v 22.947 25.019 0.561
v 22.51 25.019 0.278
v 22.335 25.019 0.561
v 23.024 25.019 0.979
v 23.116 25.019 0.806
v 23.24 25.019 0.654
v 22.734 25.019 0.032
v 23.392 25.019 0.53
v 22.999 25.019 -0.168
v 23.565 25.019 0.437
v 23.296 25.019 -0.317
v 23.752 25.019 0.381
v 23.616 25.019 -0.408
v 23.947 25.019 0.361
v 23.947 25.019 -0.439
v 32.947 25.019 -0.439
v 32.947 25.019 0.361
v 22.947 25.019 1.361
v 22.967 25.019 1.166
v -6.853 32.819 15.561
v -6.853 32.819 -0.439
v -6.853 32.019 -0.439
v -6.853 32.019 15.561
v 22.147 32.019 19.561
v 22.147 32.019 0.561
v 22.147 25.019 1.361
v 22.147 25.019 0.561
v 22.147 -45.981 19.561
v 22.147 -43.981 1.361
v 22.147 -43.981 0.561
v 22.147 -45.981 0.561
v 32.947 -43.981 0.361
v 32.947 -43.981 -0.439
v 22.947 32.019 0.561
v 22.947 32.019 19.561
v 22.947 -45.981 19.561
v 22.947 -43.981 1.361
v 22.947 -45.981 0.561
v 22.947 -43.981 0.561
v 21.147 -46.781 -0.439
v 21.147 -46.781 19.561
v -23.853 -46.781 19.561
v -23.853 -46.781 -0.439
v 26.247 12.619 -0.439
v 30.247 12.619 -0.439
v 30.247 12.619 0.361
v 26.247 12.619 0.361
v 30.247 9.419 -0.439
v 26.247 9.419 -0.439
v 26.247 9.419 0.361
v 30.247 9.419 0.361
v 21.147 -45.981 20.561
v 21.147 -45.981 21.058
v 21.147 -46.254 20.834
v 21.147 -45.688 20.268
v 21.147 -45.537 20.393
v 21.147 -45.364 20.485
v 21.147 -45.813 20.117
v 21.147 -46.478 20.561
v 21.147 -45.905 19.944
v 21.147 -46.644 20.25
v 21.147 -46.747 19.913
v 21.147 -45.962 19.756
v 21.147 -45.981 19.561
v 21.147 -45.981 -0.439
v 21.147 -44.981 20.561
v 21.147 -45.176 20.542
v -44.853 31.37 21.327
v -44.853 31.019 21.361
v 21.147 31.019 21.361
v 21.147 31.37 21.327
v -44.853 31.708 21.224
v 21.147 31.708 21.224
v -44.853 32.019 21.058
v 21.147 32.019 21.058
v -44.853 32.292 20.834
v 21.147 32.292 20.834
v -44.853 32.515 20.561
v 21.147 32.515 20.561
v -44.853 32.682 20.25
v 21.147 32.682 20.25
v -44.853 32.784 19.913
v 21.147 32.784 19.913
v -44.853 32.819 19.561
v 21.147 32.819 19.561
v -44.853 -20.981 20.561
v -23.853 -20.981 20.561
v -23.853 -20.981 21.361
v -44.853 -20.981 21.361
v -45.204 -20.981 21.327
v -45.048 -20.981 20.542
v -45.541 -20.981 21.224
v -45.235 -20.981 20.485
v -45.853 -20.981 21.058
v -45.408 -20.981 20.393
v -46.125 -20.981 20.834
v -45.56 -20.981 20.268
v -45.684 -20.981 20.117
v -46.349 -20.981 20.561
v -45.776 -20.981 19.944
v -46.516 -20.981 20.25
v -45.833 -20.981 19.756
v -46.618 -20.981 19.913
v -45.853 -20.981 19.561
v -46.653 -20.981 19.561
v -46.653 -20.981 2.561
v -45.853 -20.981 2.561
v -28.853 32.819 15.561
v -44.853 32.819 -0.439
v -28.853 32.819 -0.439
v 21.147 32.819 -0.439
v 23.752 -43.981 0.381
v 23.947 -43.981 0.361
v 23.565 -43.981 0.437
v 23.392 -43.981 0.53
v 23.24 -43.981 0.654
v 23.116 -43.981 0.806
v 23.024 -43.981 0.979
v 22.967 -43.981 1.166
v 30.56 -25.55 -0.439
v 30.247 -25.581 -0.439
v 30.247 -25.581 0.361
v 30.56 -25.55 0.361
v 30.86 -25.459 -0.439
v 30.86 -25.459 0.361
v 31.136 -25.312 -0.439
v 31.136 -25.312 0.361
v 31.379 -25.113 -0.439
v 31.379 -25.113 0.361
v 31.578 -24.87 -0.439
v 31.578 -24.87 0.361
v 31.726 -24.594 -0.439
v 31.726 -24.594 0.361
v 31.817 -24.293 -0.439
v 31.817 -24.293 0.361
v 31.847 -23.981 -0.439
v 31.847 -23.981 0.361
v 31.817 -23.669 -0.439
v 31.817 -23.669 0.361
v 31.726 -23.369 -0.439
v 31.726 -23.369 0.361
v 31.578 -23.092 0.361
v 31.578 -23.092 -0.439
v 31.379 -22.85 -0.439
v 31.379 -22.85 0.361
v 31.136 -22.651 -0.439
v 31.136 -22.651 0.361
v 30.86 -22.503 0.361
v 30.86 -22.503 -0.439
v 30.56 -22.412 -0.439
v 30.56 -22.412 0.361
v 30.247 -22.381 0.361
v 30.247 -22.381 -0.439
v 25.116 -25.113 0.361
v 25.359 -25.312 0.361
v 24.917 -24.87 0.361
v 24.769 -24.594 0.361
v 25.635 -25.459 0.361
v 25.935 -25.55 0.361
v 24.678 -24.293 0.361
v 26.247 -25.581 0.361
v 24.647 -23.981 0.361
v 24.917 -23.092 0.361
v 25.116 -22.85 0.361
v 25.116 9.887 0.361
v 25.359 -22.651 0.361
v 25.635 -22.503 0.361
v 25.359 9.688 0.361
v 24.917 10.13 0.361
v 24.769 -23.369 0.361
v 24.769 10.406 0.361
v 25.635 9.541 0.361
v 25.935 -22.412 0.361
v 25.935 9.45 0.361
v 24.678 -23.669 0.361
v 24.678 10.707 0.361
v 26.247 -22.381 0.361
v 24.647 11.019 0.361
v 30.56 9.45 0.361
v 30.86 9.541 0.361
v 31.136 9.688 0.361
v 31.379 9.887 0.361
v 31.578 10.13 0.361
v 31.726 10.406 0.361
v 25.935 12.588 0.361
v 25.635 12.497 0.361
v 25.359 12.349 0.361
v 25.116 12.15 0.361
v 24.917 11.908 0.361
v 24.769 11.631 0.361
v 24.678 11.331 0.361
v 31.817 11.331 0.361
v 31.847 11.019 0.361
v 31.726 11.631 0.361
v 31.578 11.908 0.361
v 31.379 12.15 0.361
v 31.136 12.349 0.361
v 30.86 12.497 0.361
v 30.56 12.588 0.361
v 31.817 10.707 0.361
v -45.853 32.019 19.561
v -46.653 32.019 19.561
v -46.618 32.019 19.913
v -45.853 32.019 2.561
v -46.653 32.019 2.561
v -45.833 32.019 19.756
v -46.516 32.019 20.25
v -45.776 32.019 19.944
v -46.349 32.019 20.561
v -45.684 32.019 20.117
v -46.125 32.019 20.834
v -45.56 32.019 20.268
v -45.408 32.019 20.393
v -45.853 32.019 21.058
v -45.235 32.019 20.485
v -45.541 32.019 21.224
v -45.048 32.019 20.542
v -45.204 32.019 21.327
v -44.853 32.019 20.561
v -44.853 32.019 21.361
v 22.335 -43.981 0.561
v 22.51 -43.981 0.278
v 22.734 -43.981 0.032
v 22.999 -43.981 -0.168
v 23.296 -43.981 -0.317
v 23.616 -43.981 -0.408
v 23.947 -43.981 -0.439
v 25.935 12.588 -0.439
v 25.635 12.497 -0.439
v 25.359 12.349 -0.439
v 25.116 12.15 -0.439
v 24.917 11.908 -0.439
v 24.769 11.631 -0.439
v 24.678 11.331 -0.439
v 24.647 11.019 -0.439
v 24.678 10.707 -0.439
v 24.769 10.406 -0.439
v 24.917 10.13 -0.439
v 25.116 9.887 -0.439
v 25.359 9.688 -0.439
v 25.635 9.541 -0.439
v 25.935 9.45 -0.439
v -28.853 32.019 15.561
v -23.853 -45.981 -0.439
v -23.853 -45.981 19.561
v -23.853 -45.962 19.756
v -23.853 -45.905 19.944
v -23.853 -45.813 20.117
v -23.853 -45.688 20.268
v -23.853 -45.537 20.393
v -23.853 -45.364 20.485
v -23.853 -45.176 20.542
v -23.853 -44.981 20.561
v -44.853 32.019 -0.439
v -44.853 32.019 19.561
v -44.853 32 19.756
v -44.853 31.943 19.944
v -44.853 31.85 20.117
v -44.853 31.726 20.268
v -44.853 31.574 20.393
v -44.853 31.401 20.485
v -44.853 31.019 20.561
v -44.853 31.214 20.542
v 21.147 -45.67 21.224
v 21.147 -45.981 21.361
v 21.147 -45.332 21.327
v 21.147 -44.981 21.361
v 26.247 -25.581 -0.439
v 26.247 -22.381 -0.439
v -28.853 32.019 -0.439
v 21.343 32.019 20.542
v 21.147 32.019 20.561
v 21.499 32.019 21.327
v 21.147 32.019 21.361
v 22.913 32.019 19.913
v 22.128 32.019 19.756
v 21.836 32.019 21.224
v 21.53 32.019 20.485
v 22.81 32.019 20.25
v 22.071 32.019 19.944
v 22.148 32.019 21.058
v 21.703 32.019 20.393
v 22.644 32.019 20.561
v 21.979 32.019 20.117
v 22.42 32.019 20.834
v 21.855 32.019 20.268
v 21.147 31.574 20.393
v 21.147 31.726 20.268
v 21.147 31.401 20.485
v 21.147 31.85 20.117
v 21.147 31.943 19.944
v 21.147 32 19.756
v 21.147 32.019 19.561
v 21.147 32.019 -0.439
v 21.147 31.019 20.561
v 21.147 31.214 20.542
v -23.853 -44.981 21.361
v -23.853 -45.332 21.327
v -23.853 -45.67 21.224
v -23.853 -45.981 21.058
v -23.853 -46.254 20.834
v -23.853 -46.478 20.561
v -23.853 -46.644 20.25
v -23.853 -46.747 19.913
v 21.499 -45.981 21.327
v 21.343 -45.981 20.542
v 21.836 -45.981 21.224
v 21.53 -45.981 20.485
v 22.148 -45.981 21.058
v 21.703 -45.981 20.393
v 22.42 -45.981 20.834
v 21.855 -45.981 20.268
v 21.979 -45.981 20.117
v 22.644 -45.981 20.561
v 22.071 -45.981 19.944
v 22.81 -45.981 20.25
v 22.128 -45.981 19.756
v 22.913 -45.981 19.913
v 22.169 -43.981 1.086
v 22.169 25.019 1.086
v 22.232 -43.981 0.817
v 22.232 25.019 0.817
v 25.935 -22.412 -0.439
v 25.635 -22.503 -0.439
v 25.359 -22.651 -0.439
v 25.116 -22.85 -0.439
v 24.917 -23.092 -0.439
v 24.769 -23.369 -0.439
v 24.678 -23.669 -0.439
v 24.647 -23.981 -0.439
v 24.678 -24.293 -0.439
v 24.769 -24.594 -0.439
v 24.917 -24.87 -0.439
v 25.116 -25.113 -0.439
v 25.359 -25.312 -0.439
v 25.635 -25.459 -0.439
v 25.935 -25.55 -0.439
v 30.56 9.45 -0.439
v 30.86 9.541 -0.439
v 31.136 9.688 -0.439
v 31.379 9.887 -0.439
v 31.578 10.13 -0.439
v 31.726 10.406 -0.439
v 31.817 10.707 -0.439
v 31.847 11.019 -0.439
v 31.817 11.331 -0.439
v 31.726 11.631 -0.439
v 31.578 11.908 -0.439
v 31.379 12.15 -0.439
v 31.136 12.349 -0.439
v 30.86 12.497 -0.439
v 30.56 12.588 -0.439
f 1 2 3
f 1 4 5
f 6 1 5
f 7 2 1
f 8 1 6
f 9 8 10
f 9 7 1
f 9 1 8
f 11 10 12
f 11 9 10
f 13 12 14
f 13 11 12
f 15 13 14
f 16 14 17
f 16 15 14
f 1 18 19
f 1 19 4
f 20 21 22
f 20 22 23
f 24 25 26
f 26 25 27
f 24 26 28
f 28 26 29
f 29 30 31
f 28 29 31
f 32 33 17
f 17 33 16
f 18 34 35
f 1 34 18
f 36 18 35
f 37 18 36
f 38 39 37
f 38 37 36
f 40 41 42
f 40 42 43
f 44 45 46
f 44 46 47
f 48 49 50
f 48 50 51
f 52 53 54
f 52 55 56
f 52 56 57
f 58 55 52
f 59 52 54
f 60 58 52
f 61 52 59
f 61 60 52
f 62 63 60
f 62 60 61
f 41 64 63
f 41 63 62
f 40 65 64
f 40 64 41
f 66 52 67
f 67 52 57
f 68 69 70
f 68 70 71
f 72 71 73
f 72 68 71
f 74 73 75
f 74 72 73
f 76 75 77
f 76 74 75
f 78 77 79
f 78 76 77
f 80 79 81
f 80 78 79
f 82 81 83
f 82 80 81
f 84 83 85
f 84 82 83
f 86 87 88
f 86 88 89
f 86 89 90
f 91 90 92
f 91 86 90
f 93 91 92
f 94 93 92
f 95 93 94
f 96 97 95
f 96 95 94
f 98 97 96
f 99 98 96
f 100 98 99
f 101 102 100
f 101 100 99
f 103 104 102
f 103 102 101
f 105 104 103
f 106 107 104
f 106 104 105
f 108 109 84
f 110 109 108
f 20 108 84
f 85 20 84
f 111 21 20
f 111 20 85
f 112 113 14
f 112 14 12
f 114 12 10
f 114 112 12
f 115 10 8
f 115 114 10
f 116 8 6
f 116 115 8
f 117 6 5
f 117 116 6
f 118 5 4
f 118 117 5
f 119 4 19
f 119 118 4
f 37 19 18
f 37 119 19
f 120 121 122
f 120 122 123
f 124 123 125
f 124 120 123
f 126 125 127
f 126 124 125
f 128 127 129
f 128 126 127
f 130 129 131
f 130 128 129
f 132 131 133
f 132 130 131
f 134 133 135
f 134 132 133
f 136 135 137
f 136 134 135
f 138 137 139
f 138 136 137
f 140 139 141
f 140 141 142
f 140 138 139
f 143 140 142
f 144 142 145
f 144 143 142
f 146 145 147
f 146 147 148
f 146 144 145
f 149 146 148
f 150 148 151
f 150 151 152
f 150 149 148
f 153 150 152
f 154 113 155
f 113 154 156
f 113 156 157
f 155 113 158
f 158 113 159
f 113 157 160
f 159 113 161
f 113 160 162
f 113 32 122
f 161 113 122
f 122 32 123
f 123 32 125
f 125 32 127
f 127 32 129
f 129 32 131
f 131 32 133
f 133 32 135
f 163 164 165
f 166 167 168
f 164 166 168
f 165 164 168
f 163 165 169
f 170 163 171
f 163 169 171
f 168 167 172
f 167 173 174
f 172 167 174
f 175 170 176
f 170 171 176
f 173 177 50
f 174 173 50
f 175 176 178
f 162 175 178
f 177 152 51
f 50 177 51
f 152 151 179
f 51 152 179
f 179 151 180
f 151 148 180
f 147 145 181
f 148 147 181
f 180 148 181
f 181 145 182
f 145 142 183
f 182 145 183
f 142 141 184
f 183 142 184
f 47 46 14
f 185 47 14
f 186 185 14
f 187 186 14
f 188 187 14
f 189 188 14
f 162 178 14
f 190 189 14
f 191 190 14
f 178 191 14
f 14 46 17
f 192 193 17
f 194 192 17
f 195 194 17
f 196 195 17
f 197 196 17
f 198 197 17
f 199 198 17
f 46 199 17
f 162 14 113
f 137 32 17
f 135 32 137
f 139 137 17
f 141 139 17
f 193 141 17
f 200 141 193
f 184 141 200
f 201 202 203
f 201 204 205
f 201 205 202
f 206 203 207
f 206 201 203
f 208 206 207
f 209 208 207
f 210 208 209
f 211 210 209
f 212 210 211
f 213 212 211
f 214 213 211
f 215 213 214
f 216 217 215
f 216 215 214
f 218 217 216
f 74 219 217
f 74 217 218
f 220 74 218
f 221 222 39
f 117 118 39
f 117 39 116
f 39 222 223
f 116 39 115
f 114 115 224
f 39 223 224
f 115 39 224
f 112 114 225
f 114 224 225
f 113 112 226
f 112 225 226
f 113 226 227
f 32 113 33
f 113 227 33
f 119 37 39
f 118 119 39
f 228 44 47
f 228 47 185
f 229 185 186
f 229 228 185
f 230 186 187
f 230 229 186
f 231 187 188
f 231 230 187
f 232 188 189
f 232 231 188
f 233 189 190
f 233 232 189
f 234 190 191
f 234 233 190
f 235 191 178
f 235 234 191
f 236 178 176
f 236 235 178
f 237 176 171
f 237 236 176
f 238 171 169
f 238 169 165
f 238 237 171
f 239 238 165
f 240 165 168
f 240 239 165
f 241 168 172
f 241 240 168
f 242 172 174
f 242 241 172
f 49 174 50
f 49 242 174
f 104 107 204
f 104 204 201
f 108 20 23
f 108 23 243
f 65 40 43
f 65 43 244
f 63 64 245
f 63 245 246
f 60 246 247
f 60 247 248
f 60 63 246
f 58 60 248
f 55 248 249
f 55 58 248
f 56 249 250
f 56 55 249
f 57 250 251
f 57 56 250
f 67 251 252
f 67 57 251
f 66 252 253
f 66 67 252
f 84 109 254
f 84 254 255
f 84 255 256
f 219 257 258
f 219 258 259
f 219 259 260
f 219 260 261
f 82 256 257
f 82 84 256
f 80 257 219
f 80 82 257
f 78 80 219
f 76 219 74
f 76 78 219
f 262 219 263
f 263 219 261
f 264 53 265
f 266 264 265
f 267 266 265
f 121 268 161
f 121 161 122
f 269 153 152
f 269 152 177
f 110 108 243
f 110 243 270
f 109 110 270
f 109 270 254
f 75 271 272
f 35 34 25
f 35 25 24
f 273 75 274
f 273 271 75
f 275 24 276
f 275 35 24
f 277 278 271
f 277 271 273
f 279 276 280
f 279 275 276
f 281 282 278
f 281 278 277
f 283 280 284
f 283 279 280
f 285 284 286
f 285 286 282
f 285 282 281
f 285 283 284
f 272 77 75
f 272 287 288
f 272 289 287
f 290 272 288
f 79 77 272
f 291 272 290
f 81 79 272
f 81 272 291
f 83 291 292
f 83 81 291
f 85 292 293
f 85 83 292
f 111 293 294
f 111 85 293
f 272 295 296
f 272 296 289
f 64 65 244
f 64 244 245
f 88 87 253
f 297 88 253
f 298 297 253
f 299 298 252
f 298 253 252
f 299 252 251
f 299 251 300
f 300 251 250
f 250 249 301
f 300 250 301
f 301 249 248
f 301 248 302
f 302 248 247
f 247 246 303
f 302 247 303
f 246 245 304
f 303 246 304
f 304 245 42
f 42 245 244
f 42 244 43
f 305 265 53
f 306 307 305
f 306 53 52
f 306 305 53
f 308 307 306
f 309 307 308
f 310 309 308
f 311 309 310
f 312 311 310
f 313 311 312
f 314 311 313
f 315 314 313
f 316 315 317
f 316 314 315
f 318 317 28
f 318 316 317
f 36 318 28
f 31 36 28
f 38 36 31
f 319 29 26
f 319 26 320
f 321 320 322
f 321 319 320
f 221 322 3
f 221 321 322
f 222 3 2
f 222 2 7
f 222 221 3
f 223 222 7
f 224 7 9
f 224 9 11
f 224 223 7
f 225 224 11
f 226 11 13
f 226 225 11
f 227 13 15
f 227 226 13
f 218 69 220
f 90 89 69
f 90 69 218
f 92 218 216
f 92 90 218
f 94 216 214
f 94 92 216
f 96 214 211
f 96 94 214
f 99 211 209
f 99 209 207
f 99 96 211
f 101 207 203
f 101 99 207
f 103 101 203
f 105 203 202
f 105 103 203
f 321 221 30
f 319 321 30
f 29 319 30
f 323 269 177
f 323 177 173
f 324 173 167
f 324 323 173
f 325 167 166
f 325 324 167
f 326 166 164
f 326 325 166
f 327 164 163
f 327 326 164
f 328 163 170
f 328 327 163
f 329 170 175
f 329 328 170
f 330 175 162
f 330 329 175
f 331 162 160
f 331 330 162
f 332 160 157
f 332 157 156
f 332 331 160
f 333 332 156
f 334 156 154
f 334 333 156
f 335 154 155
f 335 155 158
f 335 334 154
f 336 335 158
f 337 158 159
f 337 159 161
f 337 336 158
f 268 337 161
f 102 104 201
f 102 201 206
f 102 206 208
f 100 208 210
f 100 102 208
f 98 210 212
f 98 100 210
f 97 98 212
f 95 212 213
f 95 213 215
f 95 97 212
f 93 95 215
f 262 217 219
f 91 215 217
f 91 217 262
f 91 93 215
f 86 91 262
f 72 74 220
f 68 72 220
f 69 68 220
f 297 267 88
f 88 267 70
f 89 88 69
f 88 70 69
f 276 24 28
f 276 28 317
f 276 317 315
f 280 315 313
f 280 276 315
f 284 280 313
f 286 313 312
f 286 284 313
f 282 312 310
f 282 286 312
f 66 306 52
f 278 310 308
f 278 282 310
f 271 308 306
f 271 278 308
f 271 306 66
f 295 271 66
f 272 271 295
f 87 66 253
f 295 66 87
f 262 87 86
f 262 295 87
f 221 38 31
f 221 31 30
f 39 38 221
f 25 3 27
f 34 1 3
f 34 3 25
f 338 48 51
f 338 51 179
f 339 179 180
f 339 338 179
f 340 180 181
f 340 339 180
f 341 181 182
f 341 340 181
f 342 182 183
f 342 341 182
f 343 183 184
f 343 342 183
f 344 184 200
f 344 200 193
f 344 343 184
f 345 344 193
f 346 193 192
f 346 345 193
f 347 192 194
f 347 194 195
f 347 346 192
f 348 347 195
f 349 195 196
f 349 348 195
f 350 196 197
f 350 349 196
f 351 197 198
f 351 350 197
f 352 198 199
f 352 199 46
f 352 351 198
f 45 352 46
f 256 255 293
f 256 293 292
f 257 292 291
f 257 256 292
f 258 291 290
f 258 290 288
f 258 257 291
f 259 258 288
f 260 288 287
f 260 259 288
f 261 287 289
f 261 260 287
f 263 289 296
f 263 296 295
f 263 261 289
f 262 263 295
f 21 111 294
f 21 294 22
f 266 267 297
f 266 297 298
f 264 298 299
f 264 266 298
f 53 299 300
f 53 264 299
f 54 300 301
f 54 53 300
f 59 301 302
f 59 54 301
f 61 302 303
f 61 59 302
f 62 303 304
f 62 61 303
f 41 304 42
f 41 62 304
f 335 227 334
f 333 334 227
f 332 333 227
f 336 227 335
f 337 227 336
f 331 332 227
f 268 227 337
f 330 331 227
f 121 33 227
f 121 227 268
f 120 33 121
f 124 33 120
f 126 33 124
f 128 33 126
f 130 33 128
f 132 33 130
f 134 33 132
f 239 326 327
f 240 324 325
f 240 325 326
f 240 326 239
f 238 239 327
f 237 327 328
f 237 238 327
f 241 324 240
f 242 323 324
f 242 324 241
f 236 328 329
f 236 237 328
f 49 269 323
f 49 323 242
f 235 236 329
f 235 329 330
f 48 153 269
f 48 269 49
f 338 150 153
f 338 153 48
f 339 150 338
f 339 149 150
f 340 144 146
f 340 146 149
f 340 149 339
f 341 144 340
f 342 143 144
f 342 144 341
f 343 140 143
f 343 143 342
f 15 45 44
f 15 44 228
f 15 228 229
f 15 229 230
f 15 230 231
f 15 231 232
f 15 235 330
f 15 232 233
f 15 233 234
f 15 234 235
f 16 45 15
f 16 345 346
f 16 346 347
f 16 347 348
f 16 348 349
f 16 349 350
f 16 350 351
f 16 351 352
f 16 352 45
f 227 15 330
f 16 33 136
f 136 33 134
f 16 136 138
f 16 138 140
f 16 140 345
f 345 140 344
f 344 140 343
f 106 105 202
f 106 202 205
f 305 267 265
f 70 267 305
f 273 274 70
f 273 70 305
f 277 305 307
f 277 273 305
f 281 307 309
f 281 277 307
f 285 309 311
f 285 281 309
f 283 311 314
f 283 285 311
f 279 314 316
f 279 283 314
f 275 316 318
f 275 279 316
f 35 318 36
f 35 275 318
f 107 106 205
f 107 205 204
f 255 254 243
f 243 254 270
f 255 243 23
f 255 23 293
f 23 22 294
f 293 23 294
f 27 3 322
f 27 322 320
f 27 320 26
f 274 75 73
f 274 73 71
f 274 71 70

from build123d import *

# Parameters (mm, degrees)
BASE_FLANGE1_DEPTH           = 0.8
EDGE_FLANGE1_STRIP_W         = 5.2
EDGE_FLANGE1_STRIP_H         = 0.8
EDGE_FLANGE1_STRIP_CUT_DEPTH = 53
EDGE_FLANGE1_DEPTH           = 53
EDGE_FLANGE4_STRIP_W         = 5.2
EDGE_FLANGE4_STRIP_H         = 0.8
EDGE_FLANGE4_STRIP_CUT_DEPTH = 78
EDGE_FLANGE4_DEPTH           = 78
EDGE_FLANGE4_START           = 0.8
EDGE_FLANGE4_FLAT_DEPTH      = 0.8
EDGE_FLANGE6_STRIP_W         = 5.2
EDGE_FLANGE6_STRIP_H         = 0.8
EDGE_FLANGE6_STRIP_CUT_DEPTH = 69
EDGE_FLANGE6_DEPTH           = 69
EDGE_FLANGE6_PROFILE_W       = 69
EDGE_FLANGE6_PROFILE_H       = 9
EDGE_FLANGE6_FLAT_DEPTH      = 0.8
EDGE_FLANGE7_STRIP_W         = 5.2
EDGE_FLANGE7_STRIP_H         = 0.8
EDGE_FLANGE7_STRIP_CUT_DEPTH = 45
EDGE_FLANGE7_DEPTH           = 45
EDGE_FLANGE8_STRIP_W         = 5.2
EDGE_FLANGE8_STRIP_H         = 0.8
EDGE_FLANGE8_STRIP_CUT_DEPTH = 66
EDGE_FLANGE8_DEPTH           = 66
EDGE_FLANGE8_START           = 0.8
EDGE_FLANGE8_FLAT_DEPTH      = 0.8


# Sheet-metal steps are written as plain solids
with BuildPart() as part:
    # Sketch1 → Base-Flange1 (new body)
    with BuildSketch(Plane.XY.offset(20.561355821)):
        Polygon((22.147479573, -45.981220417), (-23.852520427, -45.981220417), (-23.852520427, -20.981220417), (-45.852520427, -20.981220417), (-45.852520427, 32.018779583), (22.147479573, 32.018779583), align=None)
    extrude(amount=BASE_FLANGE1_DEPTH)

    # Edge-Flange1 strip (across the edge) → Edge-Flange1 strip cut (cut)
    with BuildSketch(Plane(origin=(-45.852520427, -20.981220417, 20.561355821), x_dir=(1, 0, 0), z_dir=(0, 1, 0))):
        with Locations((-1.6, -0.4)):
            Rectangle(EDGE_FLANGE1_STRIP_W, EDGE_FLANGE1_STRIP_H)
    extrude(amount=EDGE_FLANGE1_STRIP_CUT_DEPTH, mode=Mode.SUBTRACT)

    # Edge-Flange1 section (across the edge) → Edge-Flange1 (add)
    with BuildSketch(Plane(origin=(-45.852520427, -20.981220417, 20.561355821), x_dir=(1, 0, 0), z_dir=(0, 1, 0))):
        with BuildLine():
            Line((-0.8, 1), (-0.8, 18))
            Line((-0.8, 18), (0, 18))
            Line((0, 18), (0, 1))
            ThreePointArc((0, 1), (0.292893219, 0.292893219), (1, 0))
            Line((1, 0), (1, -0.8))
            ThreePointArc((1, -0.8), (-0.272792206, -0.272792206), (-0.8, 1))
        make_face()
    extrude(amount=EDGE_FLANGE1_DEPTH)

    # Edge-Flange4 strip (across the edge) → Edge-Flange4 strip cut (cut)
    with BuildSketch(Plane(origin=(22.147479573, 32.018779583, 20.561355821), x_dir=(-1, 0, 0), z_dir=(0, -1, 0))):
        with Locations((-1.6, -0.4)):
            Rectangle(EDGE_FLANGE4_STRIP_W, EDGE_FLANGE4_STRIP_H)
    extrude(amount=EDGE_FLANGE4_STRIP_CUT_DEPTH, mode=Mode.SUBTRACT)

    # Edge-Flange4 bend section (across the edge) → Edge-Flange4 (add)
    with BuildSketch(Plane(origin=(22.147479573, 32.018779583, 20.561355821), x_dir=(-1, 0, 0), z_dir=(0, -1, 0))):
        with BuildLine():
            Line((-0.8, 1), (0, 1))
            ThreePointArc((0, 1), (0.292893219, 0.292893219), (1, 0))
            Line((1, 0), (1, -0.8))
            ThreePointArc((1, -0.8), (-0.272792206, -0.272792206), (-0.8, 1))
        make_face()
    extrude(amount=EDGE_FLANGE4_DEPTH)

    # Edge-Flange4 profile (on flange) → Edge-Flange4 flat (add)
    with BuildSketch(Plane(origin=(22.147479573, 0, 20.561355821), x_dir=(0, -1, 0), z_dir=(1, 0, 0)).offset(EDGE_FLANGE4_START)):
        Polygon((45.981220417, 1), (45.981220417, 20), (43.981220417, 20), (43.981220417, 21), (-25.018779583, 21), (-25.018779583, 20), (-32.018779583, 20), (-32.018779583, 1), align=None)
    extrude(amount=-EDGE_FLANGE4_FLAT_DEPTH)

    # Edge-Flange6 strip (across the edge) → Edge-Flange6 strip cut (cut)
    with BuildSketch(Plane(origin=(22.947479573, -43.981220417, -0.438644179), x_dir=(0, 0, 1), z_dir=(0, 1, 0))):
        with Locations((-0.8, -0.4)):
            Rectangle(EDGE_FLANGE6_STRIP_W, EDGE_FLANGE6_STRIP_H)
    extrude(amount=EDGE_FLANGE6_STRIP_CUT_DEPTH, mode=Mode.SUBTRACT)

    # Edge-Flange6 bend section (across the edge) → Edge-Flange6 (add)
    with BuildSketch(Plane(origin=(22.947479573, -43.981220417, -0.438644179), x_dir=(0, 0, 1), z_dir=(0, 1, 0))):
        with BuildLine():
            Line((0, 1), (0.8, 1))
            ThreePointArc((0.8, 1), (1.092893219, 0.292893219), (1.8, 0))
            Line((1.8, 0), (1.8, -0.8))
            ThreePointArc((1.8, -0.8), (0.527207794, -0.272792206), (0, 1))
        make_face()
    extrude(amount=EDGE_FLANGE6_DEPTH)

    # Edge-Flange6 profile (on flange) → Edge-Flange6 flat (add)
    with BuildSketch(Plane(origin=(22.947479573, 0, -0.438644179), x_dir=(0, 1, 0), z_dir=(0, 0, -1))):
        with Locations((-9.481220417, 5.5)):
            Rectangle(EDGE_FLANGE6_PROFILE_W, EDGE_FLANGE6_PROFILE_H)
        with BuildLine():
            Line((-25.581220417, 3.3), (-25.581220417, 7.3))
            ThreePointArc((-25.581220417, 7.3), (-23.981220417, 8.9), (-22.381220417, 7.3))
            Line((-22.381220417, 7.3), (-22.381220417, 3.3))
            ThreePointArc((-22.381220417, 3.3), (-23.981220417, 1.7), (-25.581220417, 3.3))
        make_face(mode=Mode.SUBTRACT)
        with BuildLine():
            ThreePointArc((9.418779583, 7.3), (11.018779583, 8.9), (12.618779583, 7.3))
            Line((12.618779583, 7.3), (12.618779583, 3.3))
            ThreePointArc((12.618779583, 3.3), (11.018779583, 1.7), (9.418779583, 3.3))
            Line((9.418779583, 3.3), (9.418779583, 7.3))
        make_face(mode=Mode.SUBTRACT)
    extrude(amount=-EDGE_FLANGE6_FLAT_DEPTH)

    # Edge-Flange7 strip (across the edge) → Edge-Flange7 strip cut (cut)
    with BuildSketch(Plane(origin=(21.147479573, -45.981220417, 20.561355821), x_dir=(0, 1, 0), z_dir=(-1, 0, 0))):
        with Locations((-1.6, -0.4)):
            Rectangle(EDGE_FLANGE7_STRIP_W, EDGE_FLANGE7_STRIP_H)
    extrude(amount=EDGE_FLANGE7_STRIP_CUT_DEPTH, mode=Mode.SUBTRACT)

    # Edge-Flange7 section (across the edge) → Edge-Flange7 (add)
    with BuildSketch(Plane(origin=(21.147479573, -45.981220417, 20.561355821), x_dir=(0, 1, 0), z_dir=(-1, 0, 0))):
        with BuildLine():
            Line((-0.8, 1), (-0.8, 21))
            Line((-0.8, 21), (0, 21))
            Line((0, 21), (0, 1))
            ThreePointArc((0, 1), (0.292893219, 0.292893219), (1, 0))
            Line((1, 0), (1, -0.8))
            ThreePointArc((1, -0.8), (-0.272792206, -0.272792206), (-0.8, 1))
        make_face()
    extrude(amount=EDGE_FLANGE7_DEPTH)

    # Edge-Flange8 strip (across the edge) → Edge-Flange8 strip cut (cut)
    with BuildSketch(Plane(origin=(-44.852520427, 32.018779583, 20.561355821), x_dir=(0, -1, 0), z_dir=(1, 0, 0))):
        with Locations((-1.6, -0.4)):
            Rectangle(EDGE_FLANGE8_STRIP_W, EDGE_FLANGE8_STRIP_H)
    extrude(amount=EDGE_FLANGE8_STRIP_CUT_DEPTH, mode=Mode.SUBTRACT)

    # Edge-Flange8 bend section (across the edge) → Edge-Flange8 (add)
    with BuildSketch(Plane(origin=(-44.852520427, 32.018779583, 20.561355821), x_dir=(0, -1, 0), z_dir=(1, 0, 0))):
        with BuildLine():
            Line((-0.8, 1), (0, 1))
            ThreePointArc((0, 1), (0.292893219, 0.292893219), (1, 0))
            Line((1, 0), (1, -0.8))
            ThreePointArc((1, -0.8), (-0.272792206, -0.272792206), (-0.8, 1))
        make_face()
    extrude(amount=EDGE_FLANGE8_DEPTH)

    # Edge-Flange8 profile (on flange) → Edge-Flange8 flat (add)
    with BuildSketch(Plane(origin=(0, 32.018779583, 20.561355821), x_dir=(1, 0, 0), z_dir=(0, 1, 0)).offset(EDGE_FLANGE8_START)):
        Polygon((21.147479573, 1), (21.147479573, 21), (-6.852520427, 21), (-6.852520427, 5), (-28.852520427, 5), (-28.852520427, 21), (-44.852520427, 21), (-44.852520427, 1), align=None)
    extrude(amount=-EDGE_FLANGE8_FLAT_DEPTH)


solid = part.part
